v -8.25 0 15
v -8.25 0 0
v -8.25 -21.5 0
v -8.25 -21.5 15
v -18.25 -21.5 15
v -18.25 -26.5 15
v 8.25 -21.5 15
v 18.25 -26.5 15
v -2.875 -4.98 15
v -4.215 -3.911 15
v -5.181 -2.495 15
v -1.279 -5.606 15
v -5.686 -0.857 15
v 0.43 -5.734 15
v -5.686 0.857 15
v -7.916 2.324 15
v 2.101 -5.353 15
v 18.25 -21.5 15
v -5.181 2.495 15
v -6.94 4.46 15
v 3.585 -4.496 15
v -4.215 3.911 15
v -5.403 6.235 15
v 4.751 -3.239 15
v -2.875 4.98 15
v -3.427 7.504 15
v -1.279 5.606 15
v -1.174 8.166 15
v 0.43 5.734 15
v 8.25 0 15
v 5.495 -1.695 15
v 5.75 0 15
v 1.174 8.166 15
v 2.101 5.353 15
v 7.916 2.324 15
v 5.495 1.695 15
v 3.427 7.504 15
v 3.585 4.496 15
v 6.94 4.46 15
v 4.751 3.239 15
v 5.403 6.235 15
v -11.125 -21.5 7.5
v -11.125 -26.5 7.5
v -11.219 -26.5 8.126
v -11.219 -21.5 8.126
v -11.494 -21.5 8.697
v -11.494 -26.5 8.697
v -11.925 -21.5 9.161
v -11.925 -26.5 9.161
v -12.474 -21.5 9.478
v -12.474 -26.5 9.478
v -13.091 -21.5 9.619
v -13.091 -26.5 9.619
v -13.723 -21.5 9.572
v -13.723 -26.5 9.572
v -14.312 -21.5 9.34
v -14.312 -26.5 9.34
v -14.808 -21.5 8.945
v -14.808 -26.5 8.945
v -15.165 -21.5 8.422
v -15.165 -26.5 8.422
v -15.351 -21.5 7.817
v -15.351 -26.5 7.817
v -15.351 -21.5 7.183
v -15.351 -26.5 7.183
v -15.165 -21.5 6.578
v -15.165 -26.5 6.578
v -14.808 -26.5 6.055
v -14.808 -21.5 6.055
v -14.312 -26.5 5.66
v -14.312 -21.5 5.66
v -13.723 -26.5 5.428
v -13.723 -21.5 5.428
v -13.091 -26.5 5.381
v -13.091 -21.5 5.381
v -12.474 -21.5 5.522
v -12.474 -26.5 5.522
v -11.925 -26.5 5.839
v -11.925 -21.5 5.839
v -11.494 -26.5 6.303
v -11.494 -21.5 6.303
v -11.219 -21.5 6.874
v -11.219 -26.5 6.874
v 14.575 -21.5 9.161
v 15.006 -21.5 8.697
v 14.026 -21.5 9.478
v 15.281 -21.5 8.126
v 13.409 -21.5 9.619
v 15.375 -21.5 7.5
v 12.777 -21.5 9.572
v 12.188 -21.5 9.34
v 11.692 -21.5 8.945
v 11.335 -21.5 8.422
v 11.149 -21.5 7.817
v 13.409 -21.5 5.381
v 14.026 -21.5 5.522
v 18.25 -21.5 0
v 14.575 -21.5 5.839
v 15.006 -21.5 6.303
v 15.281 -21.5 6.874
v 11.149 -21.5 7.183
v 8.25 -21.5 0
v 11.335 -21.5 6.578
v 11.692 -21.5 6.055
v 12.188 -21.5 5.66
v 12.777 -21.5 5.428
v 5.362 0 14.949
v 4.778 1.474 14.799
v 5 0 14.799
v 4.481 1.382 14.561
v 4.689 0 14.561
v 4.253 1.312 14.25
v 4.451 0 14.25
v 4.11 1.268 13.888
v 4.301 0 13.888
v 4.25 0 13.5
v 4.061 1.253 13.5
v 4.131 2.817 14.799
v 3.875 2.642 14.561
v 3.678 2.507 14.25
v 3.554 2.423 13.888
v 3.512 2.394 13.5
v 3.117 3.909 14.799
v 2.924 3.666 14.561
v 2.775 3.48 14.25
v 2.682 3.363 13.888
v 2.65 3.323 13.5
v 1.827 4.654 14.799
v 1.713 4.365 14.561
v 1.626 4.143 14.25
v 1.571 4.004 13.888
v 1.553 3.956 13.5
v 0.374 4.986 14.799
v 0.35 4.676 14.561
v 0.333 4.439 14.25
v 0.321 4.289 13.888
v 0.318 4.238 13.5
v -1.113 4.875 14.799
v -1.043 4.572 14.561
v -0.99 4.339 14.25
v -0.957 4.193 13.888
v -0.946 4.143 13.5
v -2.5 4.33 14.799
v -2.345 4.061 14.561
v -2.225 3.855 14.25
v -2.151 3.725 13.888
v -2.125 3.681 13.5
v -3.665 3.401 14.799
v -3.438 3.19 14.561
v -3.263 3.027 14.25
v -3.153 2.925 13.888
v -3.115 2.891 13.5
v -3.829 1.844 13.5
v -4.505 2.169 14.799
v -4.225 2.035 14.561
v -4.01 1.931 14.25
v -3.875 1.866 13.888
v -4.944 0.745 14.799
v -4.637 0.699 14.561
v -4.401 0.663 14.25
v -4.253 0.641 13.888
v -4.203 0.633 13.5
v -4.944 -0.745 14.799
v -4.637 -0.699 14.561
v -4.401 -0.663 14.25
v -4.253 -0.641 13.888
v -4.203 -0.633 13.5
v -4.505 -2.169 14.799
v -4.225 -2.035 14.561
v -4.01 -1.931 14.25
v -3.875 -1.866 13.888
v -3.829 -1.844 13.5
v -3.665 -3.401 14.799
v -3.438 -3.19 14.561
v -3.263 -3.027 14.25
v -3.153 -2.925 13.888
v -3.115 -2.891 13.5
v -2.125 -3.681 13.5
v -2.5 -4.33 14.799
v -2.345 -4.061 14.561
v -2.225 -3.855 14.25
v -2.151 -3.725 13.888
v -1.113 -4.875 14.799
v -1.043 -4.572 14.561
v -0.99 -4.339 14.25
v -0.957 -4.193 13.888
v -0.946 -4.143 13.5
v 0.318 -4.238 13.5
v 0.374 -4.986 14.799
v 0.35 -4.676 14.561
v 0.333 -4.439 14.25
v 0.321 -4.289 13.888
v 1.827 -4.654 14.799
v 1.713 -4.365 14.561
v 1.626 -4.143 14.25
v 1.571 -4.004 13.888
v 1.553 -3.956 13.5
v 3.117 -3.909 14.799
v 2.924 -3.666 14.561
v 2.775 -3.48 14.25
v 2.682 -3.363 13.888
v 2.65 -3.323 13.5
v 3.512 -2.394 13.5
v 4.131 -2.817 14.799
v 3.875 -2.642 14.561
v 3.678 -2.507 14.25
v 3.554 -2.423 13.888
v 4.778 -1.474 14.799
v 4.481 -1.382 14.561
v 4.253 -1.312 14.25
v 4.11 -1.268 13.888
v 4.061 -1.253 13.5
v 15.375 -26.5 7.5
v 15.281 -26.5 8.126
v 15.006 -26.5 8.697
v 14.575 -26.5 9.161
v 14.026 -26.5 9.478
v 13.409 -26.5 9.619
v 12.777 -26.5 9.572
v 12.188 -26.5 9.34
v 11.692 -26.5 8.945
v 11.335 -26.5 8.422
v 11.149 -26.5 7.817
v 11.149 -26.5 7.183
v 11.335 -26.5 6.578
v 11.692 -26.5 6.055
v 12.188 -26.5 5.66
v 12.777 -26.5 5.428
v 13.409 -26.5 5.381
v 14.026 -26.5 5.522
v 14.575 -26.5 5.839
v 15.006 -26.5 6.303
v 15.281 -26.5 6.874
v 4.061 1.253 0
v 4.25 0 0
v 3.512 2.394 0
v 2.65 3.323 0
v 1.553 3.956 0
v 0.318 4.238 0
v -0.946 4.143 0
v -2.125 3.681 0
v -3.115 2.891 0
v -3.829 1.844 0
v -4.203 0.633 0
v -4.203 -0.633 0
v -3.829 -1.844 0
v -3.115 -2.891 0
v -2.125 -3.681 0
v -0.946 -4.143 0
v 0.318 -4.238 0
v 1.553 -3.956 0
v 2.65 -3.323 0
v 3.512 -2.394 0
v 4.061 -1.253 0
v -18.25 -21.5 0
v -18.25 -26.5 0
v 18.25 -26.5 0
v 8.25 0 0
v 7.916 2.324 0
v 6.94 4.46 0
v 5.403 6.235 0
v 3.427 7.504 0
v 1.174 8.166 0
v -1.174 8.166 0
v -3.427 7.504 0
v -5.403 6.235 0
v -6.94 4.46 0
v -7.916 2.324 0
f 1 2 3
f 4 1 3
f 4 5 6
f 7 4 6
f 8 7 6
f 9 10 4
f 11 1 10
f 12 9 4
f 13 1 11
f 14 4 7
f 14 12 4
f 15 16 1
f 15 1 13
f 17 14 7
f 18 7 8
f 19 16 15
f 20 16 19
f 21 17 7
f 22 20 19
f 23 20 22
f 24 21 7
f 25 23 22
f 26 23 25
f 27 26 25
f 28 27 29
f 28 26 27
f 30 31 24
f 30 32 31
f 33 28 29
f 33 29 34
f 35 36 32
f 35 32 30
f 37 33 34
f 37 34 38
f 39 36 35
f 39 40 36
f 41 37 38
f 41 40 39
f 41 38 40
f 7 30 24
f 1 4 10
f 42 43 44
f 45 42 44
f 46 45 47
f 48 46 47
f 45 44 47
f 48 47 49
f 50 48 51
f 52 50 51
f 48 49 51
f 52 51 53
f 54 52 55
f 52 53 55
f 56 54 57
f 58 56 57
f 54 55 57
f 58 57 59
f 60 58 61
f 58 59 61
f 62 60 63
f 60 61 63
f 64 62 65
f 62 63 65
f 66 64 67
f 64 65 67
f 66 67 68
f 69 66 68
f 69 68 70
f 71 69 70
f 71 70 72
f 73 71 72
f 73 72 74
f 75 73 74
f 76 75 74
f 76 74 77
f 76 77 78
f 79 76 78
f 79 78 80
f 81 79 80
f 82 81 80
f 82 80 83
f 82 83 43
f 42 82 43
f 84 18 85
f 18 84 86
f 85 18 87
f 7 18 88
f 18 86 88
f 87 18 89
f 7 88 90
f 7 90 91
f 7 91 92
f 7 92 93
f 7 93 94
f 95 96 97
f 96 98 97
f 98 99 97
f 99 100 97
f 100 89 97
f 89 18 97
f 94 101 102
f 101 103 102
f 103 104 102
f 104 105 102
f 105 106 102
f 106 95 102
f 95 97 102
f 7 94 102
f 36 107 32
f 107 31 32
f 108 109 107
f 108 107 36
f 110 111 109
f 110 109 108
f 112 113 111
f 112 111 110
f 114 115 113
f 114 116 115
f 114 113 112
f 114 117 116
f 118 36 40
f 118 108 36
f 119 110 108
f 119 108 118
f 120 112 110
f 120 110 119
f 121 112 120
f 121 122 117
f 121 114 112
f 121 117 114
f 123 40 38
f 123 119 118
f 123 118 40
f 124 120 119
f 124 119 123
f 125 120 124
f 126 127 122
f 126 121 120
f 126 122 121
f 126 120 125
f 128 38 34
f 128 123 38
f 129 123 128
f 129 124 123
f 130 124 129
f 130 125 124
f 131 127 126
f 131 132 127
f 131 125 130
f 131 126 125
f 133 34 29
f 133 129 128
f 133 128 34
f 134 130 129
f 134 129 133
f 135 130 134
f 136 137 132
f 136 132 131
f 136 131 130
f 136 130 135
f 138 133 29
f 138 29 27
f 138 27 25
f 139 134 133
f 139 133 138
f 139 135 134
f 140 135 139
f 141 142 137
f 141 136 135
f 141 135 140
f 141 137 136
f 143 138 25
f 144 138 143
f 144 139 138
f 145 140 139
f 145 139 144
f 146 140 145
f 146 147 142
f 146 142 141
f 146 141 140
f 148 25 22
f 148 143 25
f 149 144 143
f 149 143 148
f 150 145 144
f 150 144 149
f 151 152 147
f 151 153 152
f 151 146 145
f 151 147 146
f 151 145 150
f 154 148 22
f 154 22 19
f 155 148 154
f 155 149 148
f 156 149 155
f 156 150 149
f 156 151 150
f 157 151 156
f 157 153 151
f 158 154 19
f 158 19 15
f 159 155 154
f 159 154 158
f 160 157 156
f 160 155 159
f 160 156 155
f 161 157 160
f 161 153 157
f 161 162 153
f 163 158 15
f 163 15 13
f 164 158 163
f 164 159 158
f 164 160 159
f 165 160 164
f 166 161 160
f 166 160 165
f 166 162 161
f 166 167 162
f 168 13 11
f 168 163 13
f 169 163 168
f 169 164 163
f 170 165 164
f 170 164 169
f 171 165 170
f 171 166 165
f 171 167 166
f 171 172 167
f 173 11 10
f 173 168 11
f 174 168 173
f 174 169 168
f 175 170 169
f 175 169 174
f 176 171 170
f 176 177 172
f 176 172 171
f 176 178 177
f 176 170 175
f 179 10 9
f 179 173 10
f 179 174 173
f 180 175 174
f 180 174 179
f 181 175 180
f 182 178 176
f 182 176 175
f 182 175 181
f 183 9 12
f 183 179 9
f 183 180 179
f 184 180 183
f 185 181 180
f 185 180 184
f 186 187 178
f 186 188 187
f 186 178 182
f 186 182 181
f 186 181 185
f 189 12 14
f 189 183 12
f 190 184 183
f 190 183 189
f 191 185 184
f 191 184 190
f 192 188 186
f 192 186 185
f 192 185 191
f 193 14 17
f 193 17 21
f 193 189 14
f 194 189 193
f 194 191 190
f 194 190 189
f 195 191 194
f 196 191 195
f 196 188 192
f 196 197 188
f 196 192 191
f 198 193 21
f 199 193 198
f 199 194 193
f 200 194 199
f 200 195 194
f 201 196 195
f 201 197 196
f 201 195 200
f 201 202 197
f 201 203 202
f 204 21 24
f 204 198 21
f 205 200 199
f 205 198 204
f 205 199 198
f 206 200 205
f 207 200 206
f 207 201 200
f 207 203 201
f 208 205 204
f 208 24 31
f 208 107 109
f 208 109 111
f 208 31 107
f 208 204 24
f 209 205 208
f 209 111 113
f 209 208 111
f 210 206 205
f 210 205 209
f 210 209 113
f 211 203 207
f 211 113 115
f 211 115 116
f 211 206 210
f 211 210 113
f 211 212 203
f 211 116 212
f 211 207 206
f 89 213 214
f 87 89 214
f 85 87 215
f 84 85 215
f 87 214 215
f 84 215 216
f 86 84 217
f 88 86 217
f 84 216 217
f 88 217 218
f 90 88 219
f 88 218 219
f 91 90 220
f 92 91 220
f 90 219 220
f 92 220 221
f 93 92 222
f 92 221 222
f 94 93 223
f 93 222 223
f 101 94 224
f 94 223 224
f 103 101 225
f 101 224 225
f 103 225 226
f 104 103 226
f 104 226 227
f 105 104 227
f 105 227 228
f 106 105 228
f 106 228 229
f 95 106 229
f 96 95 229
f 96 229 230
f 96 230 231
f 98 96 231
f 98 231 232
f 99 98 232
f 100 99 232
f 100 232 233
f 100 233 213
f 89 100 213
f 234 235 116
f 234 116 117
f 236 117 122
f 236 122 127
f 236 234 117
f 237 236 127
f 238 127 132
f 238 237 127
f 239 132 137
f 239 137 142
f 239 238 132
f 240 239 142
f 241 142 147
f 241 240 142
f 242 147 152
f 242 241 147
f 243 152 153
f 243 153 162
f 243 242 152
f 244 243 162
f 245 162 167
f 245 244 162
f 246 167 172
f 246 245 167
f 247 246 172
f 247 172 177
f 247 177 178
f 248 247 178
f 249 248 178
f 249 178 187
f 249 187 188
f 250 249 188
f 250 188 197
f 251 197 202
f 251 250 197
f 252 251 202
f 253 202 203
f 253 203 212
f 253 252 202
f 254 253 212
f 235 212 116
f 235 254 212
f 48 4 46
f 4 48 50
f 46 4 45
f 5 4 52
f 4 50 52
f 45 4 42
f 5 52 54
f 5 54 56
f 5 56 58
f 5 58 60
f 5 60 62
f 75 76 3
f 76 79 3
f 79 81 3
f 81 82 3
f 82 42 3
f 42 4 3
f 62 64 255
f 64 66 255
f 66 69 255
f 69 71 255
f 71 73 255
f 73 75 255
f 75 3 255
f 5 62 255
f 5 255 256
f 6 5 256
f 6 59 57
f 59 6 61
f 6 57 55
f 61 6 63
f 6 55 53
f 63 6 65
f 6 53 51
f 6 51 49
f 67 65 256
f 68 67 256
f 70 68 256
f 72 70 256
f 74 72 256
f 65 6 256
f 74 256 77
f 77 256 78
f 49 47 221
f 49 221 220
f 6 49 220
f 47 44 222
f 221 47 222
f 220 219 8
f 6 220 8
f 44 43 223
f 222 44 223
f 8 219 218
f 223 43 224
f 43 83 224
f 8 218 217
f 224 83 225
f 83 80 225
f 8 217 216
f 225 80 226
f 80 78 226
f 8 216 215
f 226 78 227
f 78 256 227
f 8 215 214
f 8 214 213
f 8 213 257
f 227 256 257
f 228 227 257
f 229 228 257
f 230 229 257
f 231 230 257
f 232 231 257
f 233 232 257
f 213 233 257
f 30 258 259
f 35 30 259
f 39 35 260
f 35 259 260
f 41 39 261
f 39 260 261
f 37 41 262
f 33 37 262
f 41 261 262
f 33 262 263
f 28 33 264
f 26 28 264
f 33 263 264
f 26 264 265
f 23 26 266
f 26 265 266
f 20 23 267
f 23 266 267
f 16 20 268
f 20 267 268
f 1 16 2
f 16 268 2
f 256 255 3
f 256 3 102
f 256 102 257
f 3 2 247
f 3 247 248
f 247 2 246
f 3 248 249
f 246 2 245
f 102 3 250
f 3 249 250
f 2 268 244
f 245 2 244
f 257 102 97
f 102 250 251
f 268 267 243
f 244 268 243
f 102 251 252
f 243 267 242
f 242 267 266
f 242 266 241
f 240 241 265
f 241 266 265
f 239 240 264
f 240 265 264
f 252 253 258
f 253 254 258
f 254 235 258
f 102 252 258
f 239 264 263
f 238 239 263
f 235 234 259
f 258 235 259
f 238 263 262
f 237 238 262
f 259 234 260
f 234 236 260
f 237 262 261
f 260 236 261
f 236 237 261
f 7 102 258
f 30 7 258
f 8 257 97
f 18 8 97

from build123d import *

# Parameters (mm, degrees)
F0_R     = 4.25
F1_DEPTH = 15
F2_R     = 2.125
F3_DEPTH = 34.751
F4_R     = 1.5


with BuildPart() as f1:
    # F0 (on Top) → F1 (new body)
    with BuildSketch(Plane.XY):
        with BuildLine():
            Line((8.25, -21.5), (8.25, 0))
            ThreePointArc((8.25, 0), (0, 8.25), (-8.25, 0))
            Line((-8.25, 0), (-8.25, -21.5))
            Line((-8.25, -21.5), (-18.25, -21.5))
            Line((-18.25, -21.5), (-18.25, -26.5))
            Line((-18.25, -26.5), (0, -26.5))
            Line((0, -26.5), (18.25, -26.5))
            Line((18.25, -26.5), (18.25, -21.5))
            Line((18.25, -21.5), (8.25, -21.5))
        make_face()
        Circle(F0_R, mode=Mode.SUBTRACT)
    extrude(amount=F1_DEPTH)

    # F2 (on face) → F3 (cut, through all)
    with BuildSketch(Plane.XZ.offset(26.5)):
        with Locations((-13.25, 7.5)):
            Circle(F2_R)
        with Locations((13.25, 7.5)):
            Circle(F2_R)
    extrude(amount=-F3_DEPTH, mode=Mode.SUBTRACT)

    # F4
    f4_edges = [f1.edges().sort_by_distance(p)[0] for p in [
        (-4.25, 0, 15),
    ]]
    fillet(f4_edges, radius=F4_R)


solid = f1.part
